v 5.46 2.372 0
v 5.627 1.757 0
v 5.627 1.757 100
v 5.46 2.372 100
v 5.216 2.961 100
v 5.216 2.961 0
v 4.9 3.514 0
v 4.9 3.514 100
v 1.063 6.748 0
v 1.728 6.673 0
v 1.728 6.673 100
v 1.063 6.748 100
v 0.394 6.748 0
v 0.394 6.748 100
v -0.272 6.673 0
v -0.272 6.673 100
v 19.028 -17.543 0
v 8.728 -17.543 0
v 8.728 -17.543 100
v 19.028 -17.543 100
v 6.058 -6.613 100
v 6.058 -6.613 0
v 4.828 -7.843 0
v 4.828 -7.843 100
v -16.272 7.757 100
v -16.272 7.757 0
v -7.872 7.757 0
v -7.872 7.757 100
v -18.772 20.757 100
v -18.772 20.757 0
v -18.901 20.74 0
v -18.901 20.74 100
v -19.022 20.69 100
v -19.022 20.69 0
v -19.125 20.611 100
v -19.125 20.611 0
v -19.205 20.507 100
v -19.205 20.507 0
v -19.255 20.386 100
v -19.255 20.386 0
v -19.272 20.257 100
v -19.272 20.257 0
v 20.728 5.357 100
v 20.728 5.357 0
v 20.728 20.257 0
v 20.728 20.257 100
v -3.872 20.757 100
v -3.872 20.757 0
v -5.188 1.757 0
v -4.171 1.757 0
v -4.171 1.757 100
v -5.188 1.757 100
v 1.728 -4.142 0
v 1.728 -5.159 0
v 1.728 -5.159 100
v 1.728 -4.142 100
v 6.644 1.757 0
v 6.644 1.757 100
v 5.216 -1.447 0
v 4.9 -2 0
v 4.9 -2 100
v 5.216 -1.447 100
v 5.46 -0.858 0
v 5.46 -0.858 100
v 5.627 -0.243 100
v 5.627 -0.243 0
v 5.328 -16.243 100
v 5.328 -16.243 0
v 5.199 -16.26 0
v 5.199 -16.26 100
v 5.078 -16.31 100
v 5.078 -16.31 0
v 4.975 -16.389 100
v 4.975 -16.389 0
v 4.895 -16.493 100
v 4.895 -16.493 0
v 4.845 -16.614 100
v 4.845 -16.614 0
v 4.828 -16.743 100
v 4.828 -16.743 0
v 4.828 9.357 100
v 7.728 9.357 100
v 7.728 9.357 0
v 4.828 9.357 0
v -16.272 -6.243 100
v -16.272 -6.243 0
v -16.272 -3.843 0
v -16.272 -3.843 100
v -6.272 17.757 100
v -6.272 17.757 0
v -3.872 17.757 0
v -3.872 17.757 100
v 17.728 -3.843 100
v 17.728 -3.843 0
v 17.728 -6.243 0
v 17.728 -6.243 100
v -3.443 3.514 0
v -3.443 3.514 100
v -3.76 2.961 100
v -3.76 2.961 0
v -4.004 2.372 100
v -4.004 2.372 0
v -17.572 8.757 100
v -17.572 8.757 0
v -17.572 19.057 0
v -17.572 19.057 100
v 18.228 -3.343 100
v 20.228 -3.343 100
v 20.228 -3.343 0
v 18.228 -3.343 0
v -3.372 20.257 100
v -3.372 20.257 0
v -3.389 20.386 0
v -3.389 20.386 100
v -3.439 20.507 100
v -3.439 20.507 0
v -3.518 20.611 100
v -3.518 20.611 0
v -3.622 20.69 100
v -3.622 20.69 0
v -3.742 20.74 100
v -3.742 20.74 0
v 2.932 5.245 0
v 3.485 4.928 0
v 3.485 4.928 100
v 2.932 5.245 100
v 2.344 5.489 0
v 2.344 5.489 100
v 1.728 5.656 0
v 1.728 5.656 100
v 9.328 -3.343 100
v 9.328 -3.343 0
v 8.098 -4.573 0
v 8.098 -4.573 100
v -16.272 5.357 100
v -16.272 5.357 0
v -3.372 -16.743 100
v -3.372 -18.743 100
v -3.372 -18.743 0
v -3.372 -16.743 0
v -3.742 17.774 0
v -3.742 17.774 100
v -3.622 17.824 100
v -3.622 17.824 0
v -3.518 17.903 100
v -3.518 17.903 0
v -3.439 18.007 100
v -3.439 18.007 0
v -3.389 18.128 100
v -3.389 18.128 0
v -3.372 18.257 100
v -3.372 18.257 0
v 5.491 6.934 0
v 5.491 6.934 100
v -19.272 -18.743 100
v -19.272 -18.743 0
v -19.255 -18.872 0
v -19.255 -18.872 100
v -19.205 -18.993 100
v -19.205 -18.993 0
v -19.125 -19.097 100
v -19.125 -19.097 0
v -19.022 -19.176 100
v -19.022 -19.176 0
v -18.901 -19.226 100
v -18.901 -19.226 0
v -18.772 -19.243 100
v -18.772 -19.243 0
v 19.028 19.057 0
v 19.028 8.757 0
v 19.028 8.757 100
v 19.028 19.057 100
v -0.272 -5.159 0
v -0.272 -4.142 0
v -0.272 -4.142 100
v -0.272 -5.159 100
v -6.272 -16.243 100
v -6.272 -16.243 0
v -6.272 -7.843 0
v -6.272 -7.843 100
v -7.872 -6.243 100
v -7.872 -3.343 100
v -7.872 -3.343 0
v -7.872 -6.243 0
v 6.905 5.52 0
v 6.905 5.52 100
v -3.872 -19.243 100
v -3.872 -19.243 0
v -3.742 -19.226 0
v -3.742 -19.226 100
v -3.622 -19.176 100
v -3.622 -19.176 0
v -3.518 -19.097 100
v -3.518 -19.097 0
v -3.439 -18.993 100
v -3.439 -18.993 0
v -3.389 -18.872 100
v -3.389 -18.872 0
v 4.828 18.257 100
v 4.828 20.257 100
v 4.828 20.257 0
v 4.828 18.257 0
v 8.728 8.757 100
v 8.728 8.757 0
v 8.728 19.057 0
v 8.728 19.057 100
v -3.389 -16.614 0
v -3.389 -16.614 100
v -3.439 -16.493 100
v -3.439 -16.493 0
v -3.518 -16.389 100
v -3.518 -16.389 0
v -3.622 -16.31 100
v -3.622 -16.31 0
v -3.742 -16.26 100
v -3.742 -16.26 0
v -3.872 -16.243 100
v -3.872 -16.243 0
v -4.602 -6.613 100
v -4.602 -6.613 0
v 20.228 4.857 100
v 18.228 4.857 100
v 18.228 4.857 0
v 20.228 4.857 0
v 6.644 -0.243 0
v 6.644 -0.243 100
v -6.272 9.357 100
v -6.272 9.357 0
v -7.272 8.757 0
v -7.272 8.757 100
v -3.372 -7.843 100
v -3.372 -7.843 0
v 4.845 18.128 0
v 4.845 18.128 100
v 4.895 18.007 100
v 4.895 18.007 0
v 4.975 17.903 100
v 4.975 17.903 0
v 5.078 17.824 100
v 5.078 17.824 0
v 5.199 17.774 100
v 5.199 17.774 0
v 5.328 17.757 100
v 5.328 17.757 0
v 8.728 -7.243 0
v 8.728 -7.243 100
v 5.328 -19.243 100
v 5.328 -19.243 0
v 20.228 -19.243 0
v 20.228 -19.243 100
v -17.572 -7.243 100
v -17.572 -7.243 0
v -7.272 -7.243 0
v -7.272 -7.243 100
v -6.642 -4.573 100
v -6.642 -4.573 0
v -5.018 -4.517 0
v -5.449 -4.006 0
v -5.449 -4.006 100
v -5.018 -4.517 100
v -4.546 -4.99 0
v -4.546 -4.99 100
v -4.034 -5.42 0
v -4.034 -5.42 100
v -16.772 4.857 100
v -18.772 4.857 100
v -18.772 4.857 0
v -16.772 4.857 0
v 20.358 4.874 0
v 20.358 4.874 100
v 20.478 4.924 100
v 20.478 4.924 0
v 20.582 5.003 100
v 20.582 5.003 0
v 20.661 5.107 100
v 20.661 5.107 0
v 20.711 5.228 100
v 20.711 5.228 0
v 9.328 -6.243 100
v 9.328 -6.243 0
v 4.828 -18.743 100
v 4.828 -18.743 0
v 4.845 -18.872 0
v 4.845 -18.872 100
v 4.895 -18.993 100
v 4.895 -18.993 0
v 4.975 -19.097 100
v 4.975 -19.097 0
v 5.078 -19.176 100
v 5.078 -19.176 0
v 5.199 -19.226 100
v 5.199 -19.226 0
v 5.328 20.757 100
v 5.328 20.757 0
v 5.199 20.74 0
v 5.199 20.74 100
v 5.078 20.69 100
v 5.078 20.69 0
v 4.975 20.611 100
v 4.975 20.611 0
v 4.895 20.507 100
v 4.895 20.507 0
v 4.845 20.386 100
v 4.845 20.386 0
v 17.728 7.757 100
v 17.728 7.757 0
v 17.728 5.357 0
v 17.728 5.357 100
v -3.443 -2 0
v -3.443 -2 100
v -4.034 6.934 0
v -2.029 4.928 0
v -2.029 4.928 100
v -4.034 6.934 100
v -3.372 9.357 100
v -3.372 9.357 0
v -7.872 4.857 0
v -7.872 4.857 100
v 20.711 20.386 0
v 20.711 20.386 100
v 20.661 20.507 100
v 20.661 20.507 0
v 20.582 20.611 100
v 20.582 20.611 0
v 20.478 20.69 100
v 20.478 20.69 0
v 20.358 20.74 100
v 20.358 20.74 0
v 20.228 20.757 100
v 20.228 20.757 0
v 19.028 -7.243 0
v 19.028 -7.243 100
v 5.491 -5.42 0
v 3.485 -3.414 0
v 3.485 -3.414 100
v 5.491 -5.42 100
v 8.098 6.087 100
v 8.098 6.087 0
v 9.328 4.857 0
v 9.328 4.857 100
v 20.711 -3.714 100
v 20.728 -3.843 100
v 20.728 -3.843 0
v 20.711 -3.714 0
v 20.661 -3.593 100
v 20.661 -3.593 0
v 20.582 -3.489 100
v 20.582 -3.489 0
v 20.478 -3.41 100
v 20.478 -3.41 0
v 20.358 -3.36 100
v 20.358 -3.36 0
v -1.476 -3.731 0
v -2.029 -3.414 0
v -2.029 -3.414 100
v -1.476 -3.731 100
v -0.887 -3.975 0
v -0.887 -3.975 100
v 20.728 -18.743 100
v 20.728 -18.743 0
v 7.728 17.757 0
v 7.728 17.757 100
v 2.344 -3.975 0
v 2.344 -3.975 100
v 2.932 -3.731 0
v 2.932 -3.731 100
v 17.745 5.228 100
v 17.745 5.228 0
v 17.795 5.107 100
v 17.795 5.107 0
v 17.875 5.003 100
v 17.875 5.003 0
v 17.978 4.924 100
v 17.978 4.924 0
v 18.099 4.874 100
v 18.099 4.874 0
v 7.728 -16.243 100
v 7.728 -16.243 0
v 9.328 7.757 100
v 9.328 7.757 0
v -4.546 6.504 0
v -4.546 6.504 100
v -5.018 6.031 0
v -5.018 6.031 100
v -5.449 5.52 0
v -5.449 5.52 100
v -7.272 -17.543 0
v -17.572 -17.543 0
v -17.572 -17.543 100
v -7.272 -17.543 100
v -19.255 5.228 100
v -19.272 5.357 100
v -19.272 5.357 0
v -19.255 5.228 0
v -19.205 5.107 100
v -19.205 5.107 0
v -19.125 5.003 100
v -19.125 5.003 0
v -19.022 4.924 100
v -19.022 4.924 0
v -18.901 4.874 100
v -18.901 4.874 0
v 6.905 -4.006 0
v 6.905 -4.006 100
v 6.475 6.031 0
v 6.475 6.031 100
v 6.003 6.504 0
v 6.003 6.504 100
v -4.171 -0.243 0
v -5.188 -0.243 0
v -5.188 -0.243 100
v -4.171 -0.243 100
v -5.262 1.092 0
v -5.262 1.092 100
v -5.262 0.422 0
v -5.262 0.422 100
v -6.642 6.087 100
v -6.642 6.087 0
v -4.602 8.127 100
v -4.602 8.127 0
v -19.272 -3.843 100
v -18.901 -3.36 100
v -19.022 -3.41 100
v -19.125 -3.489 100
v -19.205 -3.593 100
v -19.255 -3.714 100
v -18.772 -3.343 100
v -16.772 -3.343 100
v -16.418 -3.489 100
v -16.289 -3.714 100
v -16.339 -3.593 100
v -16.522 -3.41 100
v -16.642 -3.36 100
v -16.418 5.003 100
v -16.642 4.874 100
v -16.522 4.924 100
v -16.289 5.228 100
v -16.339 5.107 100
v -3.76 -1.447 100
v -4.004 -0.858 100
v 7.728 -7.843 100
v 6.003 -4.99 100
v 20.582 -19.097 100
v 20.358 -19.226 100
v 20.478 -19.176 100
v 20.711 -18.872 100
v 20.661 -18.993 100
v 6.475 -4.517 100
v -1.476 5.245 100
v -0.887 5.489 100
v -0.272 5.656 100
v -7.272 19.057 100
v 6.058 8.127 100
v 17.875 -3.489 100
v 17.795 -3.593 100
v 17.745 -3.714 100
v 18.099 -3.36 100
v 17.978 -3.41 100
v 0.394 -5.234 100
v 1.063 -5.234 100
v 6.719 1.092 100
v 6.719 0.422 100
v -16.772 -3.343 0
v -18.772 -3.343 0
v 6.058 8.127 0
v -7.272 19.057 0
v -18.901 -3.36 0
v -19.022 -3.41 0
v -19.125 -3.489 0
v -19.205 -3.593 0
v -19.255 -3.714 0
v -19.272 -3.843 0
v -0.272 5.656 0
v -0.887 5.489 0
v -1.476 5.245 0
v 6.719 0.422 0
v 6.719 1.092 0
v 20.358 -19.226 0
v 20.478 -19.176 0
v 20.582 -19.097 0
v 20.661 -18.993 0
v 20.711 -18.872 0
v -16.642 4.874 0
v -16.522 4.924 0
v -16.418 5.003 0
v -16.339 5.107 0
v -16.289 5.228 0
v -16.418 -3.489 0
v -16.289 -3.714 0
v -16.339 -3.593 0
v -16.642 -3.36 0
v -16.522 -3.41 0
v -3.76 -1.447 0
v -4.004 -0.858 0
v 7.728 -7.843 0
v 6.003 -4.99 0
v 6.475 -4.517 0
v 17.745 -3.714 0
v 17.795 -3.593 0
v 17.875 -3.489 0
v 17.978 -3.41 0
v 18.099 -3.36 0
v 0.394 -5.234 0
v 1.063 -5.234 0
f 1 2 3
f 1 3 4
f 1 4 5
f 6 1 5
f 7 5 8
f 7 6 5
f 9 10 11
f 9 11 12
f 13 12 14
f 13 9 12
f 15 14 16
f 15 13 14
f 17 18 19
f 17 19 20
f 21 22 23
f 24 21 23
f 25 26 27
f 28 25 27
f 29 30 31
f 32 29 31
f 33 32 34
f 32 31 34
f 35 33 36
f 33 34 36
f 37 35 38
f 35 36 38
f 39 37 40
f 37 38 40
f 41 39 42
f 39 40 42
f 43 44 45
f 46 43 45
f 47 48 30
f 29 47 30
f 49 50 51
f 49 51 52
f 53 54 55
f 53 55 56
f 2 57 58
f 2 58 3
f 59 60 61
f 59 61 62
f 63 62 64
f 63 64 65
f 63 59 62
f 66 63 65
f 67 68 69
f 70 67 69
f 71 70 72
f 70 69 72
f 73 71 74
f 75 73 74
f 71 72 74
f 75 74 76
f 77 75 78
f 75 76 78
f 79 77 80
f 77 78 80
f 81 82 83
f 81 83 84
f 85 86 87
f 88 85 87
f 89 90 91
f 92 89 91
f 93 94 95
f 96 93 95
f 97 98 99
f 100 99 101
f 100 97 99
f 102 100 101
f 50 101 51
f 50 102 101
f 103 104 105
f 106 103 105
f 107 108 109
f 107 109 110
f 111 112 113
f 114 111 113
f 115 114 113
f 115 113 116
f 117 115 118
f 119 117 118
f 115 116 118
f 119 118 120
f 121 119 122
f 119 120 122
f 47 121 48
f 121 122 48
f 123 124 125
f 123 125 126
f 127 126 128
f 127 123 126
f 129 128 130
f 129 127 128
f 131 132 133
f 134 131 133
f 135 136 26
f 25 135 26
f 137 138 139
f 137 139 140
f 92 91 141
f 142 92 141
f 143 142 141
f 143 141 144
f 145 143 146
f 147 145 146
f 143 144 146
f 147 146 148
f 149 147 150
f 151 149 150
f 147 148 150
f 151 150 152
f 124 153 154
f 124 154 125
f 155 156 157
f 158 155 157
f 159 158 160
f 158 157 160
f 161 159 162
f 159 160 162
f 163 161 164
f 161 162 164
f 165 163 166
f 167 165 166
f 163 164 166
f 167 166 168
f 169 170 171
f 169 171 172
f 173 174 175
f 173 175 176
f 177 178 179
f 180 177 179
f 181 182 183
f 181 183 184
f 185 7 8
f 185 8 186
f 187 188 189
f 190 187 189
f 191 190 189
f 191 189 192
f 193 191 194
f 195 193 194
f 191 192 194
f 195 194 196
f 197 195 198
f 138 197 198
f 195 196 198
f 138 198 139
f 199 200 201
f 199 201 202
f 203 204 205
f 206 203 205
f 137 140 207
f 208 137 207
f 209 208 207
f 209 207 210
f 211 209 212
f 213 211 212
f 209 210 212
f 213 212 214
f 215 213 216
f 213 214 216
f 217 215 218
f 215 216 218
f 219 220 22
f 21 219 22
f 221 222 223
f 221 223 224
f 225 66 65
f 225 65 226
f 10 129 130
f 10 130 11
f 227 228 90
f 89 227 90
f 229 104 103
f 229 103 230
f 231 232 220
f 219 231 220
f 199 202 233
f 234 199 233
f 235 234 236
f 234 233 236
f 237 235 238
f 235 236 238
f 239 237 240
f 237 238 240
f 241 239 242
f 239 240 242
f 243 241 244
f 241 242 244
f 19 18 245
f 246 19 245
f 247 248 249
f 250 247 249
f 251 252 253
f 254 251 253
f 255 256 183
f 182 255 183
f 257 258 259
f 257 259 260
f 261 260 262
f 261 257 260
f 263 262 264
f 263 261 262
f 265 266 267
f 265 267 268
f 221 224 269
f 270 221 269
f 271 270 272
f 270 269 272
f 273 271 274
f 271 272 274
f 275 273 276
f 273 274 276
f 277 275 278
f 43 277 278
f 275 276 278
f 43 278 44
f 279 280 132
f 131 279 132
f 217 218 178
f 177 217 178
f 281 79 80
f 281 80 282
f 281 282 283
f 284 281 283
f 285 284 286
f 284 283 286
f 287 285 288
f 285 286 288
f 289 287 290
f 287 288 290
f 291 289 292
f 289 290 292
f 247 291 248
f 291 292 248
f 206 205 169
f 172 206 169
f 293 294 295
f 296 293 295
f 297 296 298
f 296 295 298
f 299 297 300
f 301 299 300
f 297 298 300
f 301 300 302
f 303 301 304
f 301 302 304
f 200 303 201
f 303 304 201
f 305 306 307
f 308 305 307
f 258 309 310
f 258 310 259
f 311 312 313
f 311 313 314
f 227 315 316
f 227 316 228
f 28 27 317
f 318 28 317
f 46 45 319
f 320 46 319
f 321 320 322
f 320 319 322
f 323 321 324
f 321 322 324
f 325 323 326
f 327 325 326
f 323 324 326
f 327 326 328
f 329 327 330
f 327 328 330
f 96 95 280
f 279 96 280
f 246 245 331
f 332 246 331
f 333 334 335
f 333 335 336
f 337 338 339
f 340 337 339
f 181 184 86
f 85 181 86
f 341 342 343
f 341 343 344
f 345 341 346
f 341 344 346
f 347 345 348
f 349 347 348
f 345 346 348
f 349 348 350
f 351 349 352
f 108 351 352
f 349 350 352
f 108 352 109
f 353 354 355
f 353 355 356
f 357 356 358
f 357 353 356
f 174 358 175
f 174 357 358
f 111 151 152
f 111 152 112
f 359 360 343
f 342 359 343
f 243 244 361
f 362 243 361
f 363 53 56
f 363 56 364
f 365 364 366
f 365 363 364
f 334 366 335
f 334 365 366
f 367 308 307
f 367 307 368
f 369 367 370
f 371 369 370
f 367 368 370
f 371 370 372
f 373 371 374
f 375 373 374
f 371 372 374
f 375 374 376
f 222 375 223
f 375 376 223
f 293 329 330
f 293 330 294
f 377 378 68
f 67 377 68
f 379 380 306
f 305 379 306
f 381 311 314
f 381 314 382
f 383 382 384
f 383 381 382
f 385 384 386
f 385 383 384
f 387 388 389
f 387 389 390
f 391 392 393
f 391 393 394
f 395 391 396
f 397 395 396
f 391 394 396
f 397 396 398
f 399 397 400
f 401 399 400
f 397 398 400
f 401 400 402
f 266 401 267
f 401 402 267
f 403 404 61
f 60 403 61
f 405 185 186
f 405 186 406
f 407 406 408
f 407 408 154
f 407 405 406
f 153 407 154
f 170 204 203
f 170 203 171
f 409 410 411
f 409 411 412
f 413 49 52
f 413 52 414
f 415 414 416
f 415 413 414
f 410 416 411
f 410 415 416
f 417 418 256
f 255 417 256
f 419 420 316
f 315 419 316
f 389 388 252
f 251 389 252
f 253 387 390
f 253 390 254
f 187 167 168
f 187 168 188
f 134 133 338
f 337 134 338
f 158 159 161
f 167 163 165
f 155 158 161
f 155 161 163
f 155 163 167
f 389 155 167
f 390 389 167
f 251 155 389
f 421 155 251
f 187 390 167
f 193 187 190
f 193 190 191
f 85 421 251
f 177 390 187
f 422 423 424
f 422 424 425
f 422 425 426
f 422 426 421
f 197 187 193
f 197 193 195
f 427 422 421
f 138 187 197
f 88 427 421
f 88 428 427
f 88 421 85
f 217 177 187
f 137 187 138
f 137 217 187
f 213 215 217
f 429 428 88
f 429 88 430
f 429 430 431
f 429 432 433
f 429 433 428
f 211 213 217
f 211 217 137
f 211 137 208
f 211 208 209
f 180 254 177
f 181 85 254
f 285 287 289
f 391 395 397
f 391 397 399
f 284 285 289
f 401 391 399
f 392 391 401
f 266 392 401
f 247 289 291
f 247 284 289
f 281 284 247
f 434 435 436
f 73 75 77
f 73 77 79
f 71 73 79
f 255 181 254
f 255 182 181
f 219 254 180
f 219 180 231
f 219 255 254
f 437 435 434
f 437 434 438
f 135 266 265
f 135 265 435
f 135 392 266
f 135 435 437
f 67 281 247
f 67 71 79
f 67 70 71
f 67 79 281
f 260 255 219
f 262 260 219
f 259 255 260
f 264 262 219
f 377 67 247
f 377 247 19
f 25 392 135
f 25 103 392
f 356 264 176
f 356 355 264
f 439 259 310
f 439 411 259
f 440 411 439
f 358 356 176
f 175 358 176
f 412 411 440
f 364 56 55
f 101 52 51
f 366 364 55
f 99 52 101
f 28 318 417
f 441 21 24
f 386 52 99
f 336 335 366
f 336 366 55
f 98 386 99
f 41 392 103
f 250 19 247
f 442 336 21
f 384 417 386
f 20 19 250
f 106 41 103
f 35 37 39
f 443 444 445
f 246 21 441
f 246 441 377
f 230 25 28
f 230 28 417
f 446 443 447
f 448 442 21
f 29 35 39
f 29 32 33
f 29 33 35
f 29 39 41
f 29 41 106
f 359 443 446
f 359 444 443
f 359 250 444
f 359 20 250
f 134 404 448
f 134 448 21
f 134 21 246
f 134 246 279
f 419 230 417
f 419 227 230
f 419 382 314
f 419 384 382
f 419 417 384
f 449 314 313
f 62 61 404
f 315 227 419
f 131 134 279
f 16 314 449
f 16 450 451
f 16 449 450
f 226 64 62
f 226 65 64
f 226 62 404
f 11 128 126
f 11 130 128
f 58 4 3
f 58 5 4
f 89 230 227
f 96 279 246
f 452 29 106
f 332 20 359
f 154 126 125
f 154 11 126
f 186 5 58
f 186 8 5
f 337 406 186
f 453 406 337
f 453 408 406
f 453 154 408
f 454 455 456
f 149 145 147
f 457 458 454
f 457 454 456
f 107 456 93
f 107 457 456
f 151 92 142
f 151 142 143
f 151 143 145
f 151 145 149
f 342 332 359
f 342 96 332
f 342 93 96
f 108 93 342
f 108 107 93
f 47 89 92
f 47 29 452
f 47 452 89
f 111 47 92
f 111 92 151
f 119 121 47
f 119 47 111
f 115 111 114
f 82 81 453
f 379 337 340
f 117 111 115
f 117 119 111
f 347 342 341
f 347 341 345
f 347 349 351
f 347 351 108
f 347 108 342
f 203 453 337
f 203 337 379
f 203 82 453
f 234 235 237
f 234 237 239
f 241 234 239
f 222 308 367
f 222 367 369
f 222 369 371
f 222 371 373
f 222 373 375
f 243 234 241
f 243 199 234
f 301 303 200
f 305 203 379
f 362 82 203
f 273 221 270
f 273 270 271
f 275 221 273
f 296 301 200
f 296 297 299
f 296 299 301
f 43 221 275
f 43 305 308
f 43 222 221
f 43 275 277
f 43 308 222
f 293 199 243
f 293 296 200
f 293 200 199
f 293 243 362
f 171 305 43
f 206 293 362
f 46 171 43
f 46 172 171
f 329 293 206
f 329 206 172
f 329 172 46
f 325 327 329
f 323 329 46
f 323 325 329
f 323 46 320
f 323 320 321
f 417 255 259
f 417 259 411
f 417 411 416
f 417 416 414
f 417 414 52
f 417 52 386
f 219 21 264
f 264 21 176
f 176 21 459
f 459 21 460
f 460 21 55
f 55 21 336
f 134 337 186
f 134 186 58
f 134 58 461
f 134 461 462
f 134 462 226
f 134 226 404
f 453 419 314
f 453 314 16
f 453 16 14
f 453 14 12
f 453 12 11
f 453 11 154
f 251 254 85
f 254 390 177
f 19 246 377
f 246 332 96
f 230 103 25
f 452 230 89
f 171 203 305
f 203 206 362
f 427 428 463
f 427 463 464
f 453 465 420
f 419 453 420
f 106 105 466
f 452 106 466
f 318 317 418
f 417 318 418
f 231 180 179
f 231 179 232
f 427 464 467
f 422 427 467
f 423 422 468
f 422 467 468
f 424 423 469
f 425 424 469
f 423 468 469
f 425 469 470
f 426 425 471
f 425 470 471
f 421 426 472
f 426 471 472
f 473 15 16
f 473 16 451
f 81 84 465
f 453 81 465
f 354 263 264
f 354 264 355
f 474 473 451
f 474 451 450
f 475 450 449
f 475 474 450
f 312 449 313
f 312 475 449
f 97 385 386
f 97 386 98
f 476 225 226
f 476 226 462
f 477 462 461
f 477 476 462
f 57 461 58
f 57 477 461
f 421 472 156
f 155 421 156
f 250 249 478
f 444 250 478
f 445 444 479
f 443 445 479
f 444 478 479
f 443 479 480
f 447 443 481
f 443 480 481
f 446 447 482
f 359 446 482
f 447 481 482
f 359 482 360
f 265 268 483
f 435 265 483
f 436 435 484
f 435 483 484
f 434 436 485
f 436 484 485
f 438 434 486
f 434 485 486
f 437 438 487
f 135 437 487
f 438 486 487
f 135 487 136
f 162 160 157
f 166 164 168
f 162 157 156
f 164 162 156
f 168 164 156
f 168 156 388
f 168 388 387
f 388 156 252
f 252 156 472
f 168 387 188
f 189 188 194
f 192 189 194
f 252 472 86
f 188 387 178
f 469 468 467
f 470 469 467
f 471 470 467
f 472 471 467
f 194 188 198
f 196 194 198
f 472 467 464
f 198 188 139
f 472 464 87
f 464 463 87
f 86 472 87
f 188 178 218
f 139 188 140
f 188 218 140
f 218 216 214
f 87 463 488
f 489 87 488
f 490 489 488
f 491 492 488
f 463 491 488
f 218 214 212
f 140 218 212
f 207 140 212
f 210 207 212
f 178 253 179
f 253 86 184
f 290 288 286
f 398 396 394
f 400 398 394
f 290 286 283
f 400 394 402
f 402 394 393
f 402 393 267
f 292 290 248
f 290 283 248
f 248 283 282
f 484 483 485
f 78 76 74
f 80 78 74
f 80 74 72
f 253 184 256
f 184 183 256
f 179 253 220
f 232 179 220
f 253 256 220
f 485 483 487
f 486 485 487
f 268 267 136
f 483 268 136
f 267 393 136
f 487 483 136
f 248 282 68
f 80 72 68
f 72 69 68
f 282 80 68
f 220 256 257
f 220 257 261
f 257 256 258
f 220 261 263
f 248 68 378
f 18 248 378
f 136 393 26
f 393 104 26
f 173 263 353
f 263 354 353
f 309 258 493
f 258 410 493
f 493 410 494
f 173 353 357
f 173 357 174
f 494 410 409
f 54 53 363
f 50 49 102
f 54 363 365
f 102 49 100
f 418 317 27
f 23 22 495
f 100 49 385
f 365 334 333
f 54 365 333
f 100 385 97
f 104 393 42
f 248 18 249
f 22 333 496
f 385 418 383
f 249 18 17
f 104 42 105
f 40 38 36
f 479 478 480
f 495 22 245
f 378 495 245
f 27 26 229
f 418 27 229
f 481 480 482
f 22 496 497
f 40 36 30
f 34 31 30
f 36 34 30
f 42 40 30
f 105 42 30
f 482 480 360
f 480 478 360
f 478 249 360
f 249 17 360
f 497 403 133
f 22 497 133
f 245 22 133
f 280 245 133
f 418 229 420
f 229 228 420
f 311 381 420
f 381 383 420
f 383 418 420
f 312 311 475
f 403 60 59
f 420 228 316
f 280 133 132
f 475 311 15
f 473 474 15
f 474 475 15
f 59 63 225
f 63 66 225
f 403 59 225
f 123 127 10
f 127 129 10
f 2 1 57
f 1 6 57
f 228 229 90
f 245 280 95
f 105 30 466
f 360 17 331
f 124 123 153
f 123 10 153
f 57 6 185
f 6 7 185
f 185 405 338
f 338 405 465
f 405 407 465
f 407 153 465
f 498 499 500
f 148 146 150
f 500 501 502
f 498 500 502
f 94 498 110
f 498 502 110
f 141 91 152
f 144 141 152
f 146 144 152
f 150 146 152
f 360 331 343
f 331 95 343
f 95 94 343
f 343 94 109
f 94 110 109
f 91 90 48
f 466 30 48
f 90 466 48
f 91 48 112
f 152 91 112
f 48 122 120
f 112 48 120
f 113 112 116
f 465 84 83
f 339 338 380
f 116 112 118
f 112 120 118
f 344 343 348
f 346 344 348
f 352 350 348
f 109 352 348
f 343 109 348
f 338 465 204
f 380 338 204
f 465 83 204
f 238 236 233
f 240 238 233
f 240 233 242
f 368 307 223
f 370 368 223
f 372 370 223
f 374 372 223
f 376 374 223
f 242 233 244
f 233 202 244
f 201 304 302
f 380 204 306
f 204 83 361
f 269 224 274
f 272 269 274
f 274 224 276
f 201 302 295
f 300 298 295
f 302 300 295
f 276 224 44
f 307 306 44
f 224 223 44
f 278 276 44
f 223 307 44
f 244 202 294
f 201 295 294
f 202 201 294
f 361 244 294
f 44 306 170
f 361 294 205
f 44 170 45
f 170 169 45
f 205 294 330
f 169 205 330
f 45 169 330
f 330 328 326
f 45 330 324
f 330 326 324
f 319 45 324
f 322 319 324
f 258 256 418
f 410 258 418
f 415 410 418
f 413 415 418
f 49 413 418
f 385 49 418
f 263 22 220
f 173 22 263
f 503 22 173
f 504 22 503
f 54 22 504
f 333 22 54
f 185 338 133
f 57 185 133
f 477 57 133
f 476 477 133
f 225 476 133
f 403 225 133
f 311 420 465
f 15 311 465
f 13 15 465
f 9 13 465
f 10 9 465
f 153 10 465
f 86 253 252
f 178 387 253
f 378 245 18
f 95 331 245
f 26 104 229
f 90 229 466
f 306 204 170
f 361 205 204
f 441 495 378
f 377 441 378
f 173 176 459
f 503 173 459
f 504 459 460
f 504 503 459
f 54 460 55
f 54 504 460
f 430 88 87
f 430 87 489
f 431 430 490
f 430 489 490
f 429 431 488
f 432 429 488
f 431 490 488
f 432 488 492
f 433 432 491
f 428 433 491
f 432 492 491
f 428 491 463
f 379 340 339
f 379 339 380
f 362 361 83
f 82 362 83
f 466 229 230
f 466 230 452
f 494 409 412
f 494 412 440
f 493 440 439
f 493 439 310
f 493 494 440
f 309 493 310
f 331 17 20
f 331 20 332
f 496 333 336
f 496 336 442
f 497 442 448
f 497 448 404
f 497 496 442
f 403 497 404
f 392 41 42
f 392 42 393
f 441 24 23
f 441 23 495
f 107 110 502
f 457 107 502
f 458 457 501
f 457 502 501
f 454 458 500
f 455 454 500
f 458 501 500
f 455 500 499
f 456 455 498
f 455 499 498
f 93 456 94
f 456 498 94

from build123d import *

# Parameters (mm, degrees)
SKETCH_1_W      = 10.3
SKETCH_1_H      = 10.3
EXTRUDE_1_DEPTH = 100


with BuildPart() as part:
    # 草图1 → 凸台-拉伸1 (new body)
    with BuildSketch(Plane.XY):
        with BuildLine():
            Line((-3.371587854, 9.357012623), (-6.271587854, 9.357012623))
            Line((-6.271587854, 9.357012623), (-6.271587854, 17.757012623))
            Line((-6.271587854, 17.757012623), (-3.871587854, 17.757012623))
            ThreePointArc((-3.871587854, 17.757012623), (-3.518034464, 17.903459232), (-3.371587854, 18.257012623))
            Line((-3.371587854, 18.257012623), (-3.371587854, 20.257012623))
            ThreePointArc((-3.371587854, 20.257012623), (-3.518034464, 20.610566013), (-3.871587854, 20.757012623))
            Line((-3.871587854, 20.757012623), (-18.771587854, 20.757012623))
            ThreePointArc((-18.771587854, 20.757012623), (-19.125141245, 20.610566013), (-19.271587854, 20.257012623))
            Line((-19.271587854, 20.257012623), (-19.271587854, 5.357012623))
            ThreePointArc((-19.271587854, 5.357012623), (-19.125141245, 5.003459232), (-18.771587854, 4.857012623))
            Line((-18.771587854, 4.857012623), (-16.771587854, 4.857012623))
            ThreePointArc((-16.771587854, 4.857012623), (-16.418034464, 5.003459232), (-16.271587854, 5.357012623))
            Line((-16.271587854, 5.357012623), (-16.271587854, 7.757012623))
            Line((-16.271587854, 7.757012623), (-7.871587854, 7.757012623))
            Line((-7.871587854, 7.757012623), (-7.871587854, 4.857012623))
            Line((-7.871587854, 4.857012623), (-6.641587854, 6.087012623))
            Line((-6.641587854, 6.087012623), (-6.641587854, -4.572987377))
            Line((-6.641587854, -4.572987377), (-7.871587854, -3.342987377))
            Line((-7.871587854, -3.342987377), (-7.871587854, -6.242987377))
            Line((-7.871587854, -6.242987377), (-16.271587854, -6.242987377))
            Line((-16.271587854, -6.242987377), (-16.271587854, -3.842987377))
            ThreePointArc((-16.271587854, -3.842987377), (-16.418034464, -3.489433987), (-16.771587854, -3.342987377))
            Line((-16.771587854, -3.342987377), (-18.771587854, -3.342987377))
            ThreePointArc((-18.771587854, -3.342987377), (-19.125141245, -3.489433987), (-19.271587854, -3.842987377))
            Line((-19.271587854, -3.842987377), (-19.271587854, -18.742987377))
            ThreePointArc((-19.271587854, -18.742987377), (-19.125141245, -19.096540768), (-18.771587854, -19.242987377))
            Line((-18.771587854, -19.242987377), (-3.871587854, -19.242987377))
            ThreePointArc((-3.871587854, -19.242987377), (-3.518034464, -19.096540768), (-3.371587854, -18.742987377))
            Line((-3.371587854, -18.742987377), (-3.371587854, -16.742987377))
            ThreePointArc((-3.371587854, -16.742987377), (-3.518034464, -16.389433987), (-3.871587854, -16.242987377))
            Line((-3.871587854, -16.242987377), (-6.271587854, -16.242987377))
            Line((-6.271587854, -16.242987377), (-6.271587854, -7.842987377))
            Line((-6.271587854, -7.842987377), (-3.371587854, -7.842987377))
            Line((-3.371587854, -7.842987377), (-4.601587854, -6.612987377))
            Line((-4.601587854, -6.612987377), (6.058412146, -6.612987377))
            Line((6.058412146, -6.612987377), (4.828412146, -7.842987377))
            Line((4.828412146, -7.842987377), (7.728412146, -7.842987377))
            Line((7.728412146, -7.842987377), (7.728412146, -16.242987377))
            Line((7.728412146, -16.242987377), (5.328412146, -16.242987377))
            ThreePointArc((5.328412146, -16.242987377), (4.974858755, -16.389433987), (4.828412146, -16.742987377))
            Line((4.828412146, -16.742987377), (4.828412146, -18.742987377))
            ThreePointArc((4.828412146, -18.742987377), (4.974858755, -19.096540768), (5.328412146, -19.242987377))
            Line((5.328412146, -19.242987377), (20.228412146, -19.242987377))
            ThreePointArc((20.228412146, -19.242987377), (20.581965536, -19.096540768), (20.728412146, -18.742987377))
            Line((20.728412146, -18.742987377), (20.728412146, -3.842987377))
            ThreePointArc((20.728412146, -3.842987377), (20.581965536, -3.489433987), (20.228412146, -3.342987377))
            Line((20.228412146, -3.342987377), (18.228412146, -3.342987377))
            ThreePointArc((18.228412146, -3.342987377), (17.874858755, -3.489433987), (17.728412146, -3.842987377))
            Line((17.728412146, -3.842987377), (17.728412146, -6.242987377))
            Line((17.728412146, -6.242987377), (9.328412146, -6.242987377))
            Line((9.328412146, -6.242987377), (9.328412146, -3.342987377))
            Line((9.328412146, -3.342987377), (8.098412146, -4.572987377))
            Line((8.098412146, -4.572987377), (8.098412146, 6.087012623))
            Line((8.098412146, 6.087012623), (9.328412146, 4.857012623))
            Line((9.328412146, 4.857012623), (9.328412146, 7.757012623))
            Line((9.328412146, 7.757012623), (17.728412146, 7.757012623))
            Line((17.728412146, 7.757012623), (17.728412146, 5.357012623))
            ThreePointArc((17.728412146, 5.357012623), (17.874858755, 5.003459232), (18.228412146, 4.857012623))
            Line((18.228412146, 4.857012623), (20.228412146, 4.857012623))
            ThreePointArc((20.228412146, 4.857012623), (20.581965536, 5.003459232), (20.728412146, 5.357012623))
            Line((20.728412146, 5.357012623), (20.728412146, 20.257012623))
            ThreePointArc((20.728412146, 20.257012623), (20.581965536, 20.610566013), (20.228412146, 20.757012623))
            Line((20.228412146, 20.757012623), (5.328412146, 20.757012623))
            ThreePointArc((5.328412146, 20.757012623), (4.974858755, 20.610566013), (4.828412146, 20.257012623))
            Line((4.828412146, 20.257012623), (4.828412146, 18.257012623))
            ThreePointArc((4.828412146, 18.257012623), (4.974858755, 17.903459232), (5.328412146, 17.757012623))
            Line((5.328412146, 17.757012623), (7.728412146, 17.757012623))
            Line((7.728412146, 17.757012623), (7.728412146, 9.357012623))
            Line((7.728412146, 9.357012623), (4.828412146, 9.357012623))
            Line((4.828412146, 9.357012623), (6.058412146, 8.127012623))
            Line((6.058412146, 8.127012623), (-4.601587854, 8.127012623))
            Line((-4.601587854, 8.127012623), (-3.371587854, 9.357012623))
        make_face()
        with Locations((-12.421587854, 13.907012623)):
            Rectangle(SKETCH_1_W, SKETCH_1_H, mode=Mode.SUBTRACT)
        with Locations((13.878412146, 13.907012623)):
            Rectangle(SKETCH_1_W, SKETCH_1_H, mode=Mode.SUBTRACT)
        with Locations((-12.421587854, -12.392987377)):
            Rectangle(SKETCH_1_W, SKETCH_1_H, mode=Mode.SUBTRACT)
        with Locations((13.878412146, -12.392987377)):
            Rectangle(SKETCH_1_W, SKETCH_1_H, mode=Mode.SUBTRACT)
        with BuildLine():
            Line((-5.448612368, 5.519823574), (-3.44279625, 3.514007457))
            ThreePointArc((-3.44279625, 3.514007457), (-3.890985517, 2.670429785), (-4.17056734, 1.757012623))
            Line((-4.17056734, 1.757012623), (-5.187667637, 1.757012623))
            ThreePointArc((-5.187667637, 1.757012623), (-5.271587854, 0.757012623), (-5.187667637, -0.242987377))
            Line((-5.187667637, -0.242987377), (-4.17056734, -0.242987377))
            ThreePointArc((-4.17056734, -0.242987377), (-3.890985517, -1.156404539), (-3.44279625, -1.999982211))
            Line((-3.44279625, -1.999982211), (-5.448612368, -4.005798329))
            ThreePointArc((-5.448612368, -4.005798329), (-4.787020747, -4.758420271), (-4.034398805, -5.420011891))
            Line((-4.034398805, -5.420011891), (-2.028582688, -3.414195774))
            ThreePointArc((-2.028582688, -3.414195774), (-1.185005016, -3.86238504), (-0.271587854, -4.141966863))
            Line((-0.271587854, -4.141966863), (-0.271587854, -5.15906716))
            ThreePointArc((-0.271587854, -5.15906716), (0.728412146, -5.242987377), (1.728412146, -5.15906716))
            Line((1.728412146, -5.15906716), (1.728412146, -4.141966863))
            ThreePointArc((1.728412146, -4.141966863), (2.641829308, -3.86238504), (3.48540698, -3.414195774))
            Line((3.48540698, -3.414195774), (5.491223097, -5.420011891))
            ThreePointArc((5.491223097, -5.420011891), (6.243845039, -4.758420271), (6.905436659, -4.005798329))
            Line((6.905436659, -4.005798329), (4.899620542, -1.999982211))
            ThreePointArc((4.899620542, -1.999982211), (5.347809808, -1.156404539), (5.627391631, -0.242987377))
            Line((5.627391631, -0.242987377), (6.644491929, -0.242987377))
            ThreePointArc((6.644491929, -0.242987377), (6.728412146, 0.757012623), (6.644491929, 1.757012623))
            Line((6.644491929, 1.757012623), (5.627391631, 1.757012623))
            ThreePointArc((5.627391631, 1.757012623), (5.347809808, 2.670429785), (4.899620542, 3.514007457))
            Line((4.899620542, 3.514007457), (6.905436659, 5.519823574))
            ThreePointArc((6.905436659, 5.519823574), (6.243845039, 6.272445516), (5.491223097, 6.934037136))
            Line((5.491223097, 6.934037136), (3.48540698, 4.928221019))
            ThreePointArc((3.48540698, 4.928221019), (2.641829308, 5.376410285), (1.728412146, 5.655992108))
            Line((1.728412146, 5.655992108), (1.728412146, 6.673092406))
            ThreePointArc((1.728412146, 6.673092406), (0.728412146, 6.757012623), (-0.271587854, 6.673092406))
            Line((-0.271587854, 6.673092406), (-0.271587854, 5.655992108))
            ThreePointArc((-0.271587854, 5.655992108), (-1.185005016, 5.376410285), (-2.028582688, 4.928221019))
            Line((-2.028582688, 4.928221019), (-4.034398805, 6.934037136))
            ThreePointArc((-4.034398805, 6.934037136), (-4.787020747, 6.272445516), (-5.448612368, 5.519823574))
        make_face(mode=Mode.SUBTRACT)
    extrude(amount=EXTRUDE_1_DEPTH)


solid = part.part
